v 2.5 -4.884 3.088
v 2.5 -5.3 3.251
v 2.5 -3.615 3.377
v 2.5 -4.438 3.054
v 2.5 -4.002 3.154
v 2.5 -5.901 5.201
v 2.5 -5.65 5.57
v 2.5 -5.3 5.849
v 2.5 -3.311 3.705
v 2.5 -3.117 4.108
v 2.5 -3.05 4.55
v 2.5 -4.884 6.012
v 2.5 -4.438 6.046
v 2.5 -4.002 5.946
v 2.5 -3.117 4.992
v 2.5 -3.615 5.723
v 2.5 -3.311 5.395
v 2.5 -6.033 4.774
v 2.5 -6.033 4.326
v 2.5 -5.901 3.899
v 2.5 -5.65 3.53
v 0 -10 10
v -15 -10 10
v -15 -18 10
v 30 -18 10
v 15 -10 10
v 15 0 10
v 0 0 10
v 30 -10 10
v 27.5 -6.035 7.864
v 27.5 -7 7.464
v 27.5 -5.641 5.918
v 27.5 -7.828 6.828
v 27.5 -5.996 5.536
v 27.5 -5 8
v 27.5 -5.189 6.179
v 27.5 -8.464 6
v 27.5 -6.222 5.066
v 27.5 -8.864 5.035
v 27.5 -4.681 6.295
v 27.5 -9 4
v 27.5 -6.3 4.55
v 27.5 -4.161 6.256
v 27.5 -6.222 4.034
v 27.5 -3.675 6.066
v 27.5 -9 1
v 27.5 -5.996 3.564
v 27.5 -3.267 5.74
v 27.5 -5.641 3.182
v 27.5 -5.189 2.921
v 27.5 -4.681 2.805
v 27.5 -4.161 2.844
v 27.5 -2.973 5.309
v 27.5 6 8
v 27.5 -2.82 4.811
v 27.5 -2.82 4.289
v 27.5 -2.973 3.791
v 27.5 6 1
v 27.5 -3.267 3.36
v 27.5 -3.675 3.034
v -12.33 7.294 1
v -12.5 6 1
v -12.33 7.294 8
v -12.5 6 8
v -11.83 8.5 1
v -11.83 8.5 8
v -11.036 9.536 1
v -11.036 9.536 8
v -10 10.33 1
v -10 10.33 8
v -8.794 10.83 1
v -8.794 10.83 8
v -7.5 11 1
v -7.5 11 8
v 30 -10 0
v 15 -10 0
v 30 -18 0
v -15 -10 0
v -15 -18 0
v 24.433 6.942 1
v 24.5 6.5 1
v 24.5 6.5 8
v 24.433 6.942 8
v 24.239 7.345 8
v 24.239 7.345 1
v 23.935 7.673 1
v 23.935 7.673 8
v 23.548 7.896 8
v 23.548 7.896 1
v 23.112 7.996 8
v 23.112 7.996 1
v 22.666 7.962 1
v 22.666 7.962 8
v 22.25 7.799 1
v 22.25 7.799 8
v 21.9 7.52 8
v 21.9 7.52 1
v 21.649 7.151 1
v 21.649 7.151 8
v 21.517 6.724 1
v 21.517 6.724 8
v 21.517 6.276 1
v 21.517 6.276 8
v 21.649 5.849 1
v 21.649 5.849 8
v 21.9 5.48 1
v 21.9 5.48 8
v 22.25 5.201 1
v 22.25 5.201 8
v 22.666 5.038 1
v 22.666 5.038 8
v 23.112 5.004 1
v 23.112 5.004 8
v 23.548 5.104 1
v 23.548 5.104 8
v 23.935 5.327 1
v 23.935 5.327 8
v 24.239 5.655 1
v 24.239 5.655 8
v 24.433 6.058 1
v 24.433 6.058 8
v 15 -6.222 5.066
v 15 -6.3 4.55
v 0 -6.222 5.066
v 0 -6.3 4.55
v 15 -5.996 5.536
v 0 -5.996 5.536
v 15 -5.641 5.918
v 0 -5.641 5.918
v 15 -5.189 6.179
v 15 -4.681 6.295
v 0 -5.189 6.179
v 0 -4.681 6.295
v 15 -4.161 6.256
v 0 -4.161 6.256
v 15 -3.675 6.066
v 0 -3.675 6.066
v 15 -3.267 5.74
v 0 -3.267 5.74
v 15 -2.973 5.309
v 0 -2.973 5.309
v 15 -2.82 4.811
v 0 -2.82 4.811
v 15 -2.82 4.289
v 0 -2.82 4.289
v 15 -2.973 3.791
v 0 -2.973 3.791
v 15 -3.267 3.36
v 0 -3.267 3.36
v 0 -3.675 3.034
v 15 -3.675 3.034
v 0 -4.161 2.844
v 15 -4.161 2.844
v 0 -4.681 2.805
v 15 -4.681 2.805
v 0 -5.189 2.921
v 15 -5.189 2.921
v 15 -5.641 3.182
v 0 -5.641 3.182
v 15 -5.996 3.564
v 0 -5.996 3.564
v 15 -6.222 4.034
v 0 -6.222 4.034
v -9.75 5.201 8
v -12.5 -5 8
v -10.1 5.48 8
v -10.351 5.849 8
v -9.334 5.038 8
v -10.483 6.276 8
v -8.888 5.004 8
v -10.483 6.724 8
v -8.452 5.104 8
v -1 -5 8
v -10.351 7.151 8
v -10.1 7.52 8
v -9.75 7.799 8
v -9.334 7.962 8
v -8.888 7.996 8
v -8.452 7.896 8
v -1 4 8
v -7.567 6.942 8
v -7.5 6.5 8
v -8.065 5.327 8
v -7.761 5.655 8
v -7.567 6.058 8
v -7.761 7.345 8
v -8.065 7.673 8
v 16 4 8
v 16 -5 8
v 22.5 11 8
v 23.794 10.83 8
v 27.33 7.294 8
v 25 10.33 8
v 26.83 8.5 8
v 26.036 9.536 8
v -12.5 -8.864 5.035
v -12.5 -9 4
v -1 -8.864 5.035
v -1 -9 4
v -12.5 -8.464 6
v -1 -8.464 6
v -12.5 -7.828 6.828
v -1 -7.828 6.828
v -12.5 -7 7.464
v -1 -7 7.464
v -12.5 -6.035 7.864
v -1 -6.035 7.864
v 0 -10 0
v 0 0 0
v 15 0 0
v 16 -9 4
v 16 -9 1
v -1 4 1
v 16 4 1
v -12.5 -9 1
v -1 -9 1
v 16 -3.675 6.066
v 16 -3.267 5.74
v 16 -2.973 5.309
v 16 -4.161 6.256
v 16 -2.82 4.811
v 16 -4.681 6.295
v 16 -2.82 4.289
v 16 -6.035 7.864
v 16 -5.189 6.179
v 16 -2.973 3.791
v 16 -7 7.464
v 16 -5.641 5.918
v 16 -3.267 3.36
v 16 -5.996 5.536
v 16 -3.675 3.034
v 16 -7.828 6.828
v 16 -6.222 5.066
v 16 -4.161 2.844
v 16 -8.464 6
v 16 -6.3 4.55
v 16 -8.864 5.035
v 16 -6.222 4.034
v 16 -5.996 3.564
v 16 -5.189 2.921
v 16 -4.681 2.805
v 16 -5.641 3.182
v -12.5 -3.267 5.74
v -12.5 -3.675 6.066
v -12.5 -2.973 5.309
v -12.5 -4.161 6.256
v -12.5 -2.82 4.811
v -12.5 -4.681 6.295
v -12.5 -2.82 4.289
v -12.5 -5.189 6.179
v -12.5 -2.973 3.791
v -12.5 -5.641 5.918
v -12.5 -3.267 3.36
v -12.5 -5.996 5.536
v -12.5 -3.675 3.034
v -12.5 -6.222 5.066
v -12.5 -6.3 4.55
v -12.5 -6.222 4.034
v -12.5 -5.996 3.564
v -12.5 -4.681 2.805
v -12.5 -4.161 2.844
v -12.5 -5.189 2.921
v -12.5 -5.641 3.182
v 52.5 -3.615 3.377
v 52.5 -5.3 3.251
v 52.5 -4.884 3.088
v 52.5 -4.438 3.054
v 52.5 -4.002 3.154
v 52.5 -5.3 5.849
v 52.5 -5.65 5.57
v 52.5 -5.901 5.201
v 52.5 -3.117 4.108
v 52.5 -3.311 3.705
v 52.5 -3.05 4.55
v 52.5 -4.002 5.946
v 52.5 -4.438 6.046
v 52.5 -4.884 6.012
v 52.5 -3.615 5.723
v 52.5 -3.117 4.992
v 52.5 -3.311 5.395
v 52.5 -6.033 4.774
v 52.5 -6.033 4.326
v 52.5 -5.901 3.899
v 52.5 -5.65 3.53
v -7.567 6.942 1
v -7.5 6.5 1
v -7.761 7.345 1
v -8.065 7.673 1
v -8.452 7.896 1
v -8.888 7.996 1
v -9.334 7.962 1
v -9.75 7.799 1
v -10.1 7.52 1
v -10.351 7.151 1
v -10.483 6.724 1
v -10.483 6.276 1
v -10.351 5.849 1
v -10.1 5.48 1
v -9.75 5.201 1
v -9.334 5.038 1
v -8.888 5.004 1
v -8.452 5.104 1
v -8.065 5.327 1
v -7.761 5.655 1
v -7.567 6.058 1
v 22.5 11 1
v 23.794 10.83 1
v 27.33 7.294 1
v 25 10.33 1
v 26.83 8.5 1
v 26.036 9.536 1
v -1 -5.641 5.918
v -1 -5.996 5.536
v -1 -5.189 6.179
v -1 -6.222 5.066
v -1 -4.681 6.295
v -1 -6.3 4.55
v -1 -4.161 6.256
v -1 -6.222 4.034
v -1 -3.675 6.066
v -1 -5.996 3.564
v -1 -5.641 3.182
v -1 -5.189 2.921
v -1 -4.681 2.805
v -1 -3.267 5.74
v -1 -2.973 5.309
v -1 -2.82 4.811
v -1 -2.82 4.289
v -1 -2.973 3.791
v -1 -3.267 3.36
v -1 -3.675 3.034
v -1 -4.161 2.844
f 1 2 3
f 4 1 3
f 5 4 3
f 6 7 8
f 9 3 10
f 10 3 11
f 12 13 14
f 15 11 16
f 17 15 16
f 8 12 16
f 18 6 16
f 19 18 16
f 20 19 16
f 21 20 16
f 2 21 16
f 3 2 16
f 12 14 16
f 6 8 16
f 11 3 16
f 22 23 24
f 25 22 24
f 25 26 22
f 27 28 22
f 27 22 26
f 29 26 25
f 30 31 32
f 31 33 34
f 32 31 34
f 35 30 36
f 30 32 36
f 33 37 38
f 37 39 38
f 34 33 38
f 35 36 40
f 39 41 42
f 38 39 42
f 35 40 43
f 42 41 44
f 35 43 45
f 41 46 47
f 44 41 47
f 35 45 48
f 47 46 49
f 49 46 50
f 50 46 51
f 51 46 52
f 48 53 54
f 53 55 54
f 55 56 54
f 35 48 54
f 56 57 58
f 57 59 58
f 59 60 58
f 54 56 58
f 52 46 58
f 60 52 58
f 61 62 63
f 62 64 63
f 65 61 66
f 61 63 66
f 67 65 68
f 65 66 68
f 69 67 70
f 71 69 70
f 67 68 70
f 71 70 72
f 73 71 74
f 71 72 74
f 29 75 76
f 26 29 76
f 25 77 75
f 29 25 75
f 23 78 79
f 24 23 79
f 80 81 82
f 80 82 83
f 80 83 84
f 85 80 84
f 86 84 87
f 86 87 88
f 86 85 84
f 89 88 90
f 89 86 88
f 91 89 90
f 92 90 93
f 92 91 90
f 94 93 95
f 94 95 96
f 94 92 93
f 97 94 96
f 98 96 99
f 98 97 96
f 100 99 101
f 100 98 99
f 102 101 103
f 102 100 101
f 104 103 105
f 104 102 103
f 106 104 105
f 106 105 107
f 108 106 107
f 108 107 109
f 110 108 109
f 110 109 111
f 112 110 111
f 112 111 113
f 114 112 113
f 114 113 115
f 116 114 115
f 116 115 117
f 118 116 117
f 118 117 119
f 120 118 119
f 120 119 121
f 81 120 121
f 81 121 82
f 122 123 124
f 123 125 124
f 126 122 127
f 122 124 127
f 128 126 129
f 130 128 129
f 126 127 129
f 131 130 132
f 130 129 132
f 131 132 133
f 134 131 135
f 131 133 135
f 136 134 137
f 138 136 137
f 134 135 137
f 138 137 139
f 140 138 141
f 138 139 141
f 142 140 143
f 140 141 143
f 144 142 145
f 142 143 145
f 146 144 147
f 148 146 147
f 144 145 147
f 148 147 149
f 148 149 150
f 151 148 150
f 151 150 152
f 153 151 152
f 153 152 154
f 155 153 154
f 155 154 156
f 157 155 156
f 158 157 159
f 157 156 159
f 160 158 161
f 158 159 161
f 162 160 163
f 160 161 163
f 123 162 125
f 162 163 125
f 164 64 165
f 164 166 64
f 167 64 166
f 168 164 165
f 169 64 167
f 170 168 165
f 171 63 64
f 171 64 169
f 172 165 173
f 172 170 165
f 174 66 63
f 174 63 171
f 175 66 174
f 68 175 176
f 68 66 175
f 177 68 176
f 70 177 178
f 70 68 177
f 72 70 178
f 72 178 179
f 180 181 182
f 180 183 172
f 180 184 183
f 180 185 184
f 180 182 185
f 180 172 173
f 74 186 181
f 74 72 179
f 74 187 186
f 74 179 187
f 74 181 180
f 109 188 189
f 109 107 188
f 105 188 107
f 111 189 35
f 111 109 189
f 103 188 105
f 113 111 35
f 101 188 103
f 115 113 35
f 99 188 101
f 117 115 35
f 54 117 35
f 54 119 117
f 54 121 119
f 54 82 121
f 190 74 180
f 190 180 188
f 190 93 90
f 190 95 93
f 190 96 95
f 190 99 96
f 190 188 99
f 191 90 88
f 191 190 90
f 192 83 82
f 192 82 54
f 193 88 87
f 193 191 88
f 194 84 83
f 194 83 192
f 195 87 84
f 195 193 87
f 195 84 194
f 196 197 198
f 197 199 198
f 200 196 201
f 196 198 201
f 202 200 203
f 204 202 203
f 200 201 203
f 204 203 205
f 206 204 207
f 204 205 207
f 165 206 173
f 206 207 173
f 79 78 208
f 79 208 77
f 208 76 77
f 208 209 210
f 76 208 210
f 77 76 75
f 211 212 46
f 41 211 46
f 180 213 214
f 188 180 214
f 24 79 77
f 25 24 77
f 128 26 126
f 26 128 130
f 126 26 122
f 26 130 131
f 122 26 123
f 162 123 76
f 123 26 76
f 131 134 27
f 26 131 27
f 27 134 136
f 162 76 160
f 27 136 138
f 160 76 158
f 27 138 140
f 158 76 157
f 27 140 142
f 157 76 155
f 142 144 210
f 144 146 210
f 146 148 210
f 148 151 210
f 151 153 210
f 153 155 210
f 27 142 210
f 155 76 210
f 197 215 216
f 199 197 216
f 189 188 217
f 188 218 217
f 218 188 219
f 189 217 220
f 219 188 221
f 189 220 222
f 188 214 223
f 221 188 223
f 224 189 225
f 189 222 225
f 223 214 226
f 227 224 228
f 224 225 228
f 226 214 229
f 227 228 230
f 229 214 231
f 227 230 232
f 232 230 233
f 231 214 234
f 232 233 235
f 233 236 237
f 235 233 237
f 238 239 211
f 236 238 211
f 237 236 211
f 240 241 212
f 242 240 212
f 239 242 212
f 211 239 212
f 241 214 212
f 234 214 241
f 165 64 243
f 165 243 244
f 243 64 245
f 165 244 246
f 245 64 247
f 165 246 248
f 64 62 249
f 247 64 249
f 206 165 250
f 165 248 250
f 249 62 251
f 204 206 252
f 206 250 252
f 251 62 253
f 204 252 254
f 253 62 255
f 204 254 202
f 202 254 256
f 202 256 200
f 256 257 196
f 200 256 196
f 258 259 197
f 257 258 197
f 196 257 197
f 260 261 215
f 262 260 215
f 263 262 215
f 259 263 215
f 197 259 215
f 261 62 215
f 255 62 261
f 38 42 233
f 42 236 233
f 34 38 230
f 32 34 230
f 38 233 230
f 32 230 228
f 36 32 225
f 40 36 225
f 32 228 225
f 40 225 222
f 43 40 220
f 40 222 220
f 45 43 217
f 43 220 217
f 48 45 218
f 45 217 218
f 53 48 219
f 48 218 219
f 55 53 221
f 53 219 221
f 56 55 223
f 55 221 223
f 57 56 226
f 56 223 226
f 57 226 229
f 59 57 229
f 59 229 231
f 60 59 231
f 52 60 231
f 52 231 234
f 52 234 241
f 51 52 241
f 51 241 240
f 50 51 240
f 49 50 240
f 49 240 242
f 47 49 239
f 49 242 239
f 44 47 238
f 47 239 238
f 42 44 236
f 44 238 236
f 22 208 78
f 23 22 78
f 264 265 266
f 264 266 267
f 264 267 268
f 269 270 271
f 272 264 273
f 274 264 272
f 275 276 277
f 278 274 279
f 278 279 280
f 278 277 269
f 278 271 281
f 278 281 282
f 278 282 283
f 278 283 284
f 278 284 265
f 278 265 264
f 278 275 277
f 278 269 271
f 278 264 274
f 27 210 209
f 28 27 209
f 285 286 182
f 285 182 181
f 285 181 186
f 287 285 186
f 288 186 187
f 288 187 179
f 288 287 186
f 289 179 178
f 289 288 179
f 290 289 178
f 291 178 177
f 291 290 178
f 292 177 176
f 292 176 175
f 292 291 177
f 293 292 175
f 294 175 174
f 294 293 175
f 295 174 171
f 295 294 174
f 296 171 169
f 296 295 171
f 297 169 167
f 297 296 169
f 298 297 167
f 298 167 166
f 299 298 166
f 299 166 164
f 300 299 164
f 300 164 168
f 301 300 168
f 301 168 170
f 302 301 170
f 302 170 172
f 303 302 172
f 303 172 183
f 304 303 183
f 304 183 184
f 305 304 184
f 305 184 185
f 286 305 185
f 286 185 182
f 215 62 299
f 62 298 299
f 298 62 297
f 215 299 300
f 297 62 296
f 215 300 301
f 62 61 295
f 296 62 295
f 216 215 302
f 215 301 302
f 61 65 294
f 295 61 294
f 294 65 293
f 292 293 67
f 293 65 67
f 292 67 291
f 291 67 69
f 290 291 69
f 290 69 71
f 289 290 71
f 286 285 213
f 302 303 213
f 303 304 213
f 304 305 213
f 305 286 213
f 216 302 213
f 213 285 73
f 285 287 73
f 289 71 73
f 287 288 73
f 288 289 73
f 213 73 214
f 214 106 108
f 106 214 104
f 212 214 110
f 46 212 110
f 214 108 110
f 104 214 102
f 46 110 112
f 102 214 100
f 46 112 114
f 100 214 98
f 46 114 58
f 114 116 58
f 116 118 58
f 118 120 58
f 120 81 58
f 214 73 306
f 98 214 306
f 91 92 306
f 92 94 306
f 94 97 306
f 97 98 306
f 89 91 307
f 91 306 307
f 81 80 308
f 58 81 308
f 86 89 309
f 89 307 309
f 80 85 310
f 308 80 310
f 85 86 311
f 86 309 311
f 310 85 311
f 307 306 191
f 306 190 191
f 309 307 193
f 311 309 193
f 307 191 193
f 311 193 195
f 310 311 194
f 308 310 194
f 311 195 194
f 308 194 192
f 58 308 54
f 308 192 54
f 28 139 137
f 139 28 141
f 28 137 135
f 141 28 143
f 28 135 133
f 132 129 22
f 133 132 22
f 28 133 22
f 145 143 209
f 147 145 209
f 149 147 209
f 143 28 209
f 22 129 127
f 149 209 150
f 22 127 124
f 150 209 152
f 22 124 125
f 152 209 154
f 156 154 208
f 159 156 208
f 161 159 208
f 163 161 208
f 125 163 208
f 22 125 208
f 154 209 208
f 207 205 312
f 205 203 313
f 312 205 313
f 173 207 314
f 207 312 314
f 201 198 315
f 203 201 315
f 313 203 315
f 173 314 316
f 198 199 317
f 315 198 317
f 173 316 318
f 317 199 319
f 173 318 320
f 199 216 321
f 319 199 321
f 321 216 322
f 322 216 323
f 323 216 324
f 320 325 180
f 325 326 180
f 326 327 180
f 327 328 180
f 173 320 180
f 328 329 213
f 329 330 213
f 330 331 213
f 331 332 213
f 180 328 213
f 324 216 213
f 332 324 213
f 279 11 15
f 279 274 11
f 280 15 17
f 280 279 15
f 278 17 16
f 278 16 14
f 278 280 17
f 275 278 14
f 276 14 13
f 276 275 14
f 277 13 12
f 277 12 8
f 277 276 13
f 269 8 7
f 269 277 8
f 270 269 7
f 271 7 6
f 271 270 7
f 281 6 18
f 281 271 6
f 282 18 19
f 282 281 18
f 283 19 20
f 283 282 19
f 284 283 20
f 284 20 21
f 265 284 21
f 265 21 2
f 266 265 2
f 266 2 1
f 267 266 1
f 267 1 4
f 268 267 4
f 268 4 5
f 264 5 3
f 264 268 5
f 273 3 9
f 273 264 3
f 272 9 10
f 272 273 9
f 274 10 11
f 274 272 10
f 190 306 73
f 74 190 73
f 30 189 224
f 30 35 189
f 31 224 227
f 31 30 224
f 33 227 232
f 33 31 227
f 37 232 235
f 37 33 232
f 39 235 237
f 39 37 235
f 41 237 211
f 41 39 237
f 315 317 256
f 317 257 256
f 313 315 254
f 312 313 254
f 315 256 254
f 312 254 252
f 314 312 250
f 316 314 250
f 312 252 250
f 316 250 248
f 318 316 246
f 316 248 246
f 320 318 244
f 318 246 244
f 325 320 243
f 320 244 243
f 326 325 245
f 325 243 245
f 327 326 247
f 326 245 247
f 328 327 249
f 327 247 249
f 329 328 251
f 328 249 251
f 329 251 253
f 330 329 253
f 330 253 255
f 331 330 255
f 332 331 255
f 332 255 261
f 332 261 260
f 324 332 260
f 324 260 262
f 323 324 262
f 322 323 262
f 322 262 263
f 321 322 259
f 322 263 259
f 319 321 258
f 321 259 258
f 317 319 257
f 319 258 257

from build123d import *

# Parameters (mm, degrees)
F1_DEPTH = 10
F0_R     = 1.5
F2_DEPTH = 8
F3_R     = 1.75
F4_DEPTH = 50
F5_R     = 1.5
F6_DEPTH = 25
F7_DEPTH = 1
F8_R     = 4
F9_R     = 5


with BuildPart() as f1:
    # F0 (on Top) → F1 (new body)
    with BuildSketch(Plane.XY):
        Polygon((15, 0), (0, 0), (0, -10), (-15, -10), (-15, -18), (30, -18), (30, -10), (15, -10), align=None)
    extrude(amount=F1_DEPTH)


with BuildPart() as f2:
    # F0 (on Top) → F2 (new body)
    with BuildSketch(Plane.XY):
        Polygon((-12.5, 11), (-12.5, -9), (-1, -9), (-1, 4), (16, 4), (16, -9), (27.5, -9), (27.5, 11), align=None)
        with Locations((-9, 6.5)):
            Circle(F0_R, mode=Mode.SUBTRACT)
        with Locations((23, 6.5)):
            Circle(F0_R, mode=Mode.SUBTRACT)
    extrude(amount=F2_DEPTH)


with BuildPart() as f4_tool:
    # F3 (on face) → F4 (new body, symmetric)
    with BuildSketch(Plane(origin=(0, 0, 0), x_dir=(0, -1, 0), z_dir=(-1, 0, 0))):
        with Locations((4.55, 4.55)):
            Circle(F3_R)
    extrude(amount=F4_DEPTH, both=True)


with BuildPart() as f1_1:
    add(f1.part)

    # F4: cut by f4_tool
    add(f4_tool.part, mode=Mode.SUBTRACT)


with BuildPart() as f2_1:
    add(f2.part)

    # F4: cut by f4_tool
    add(f4_tool.part, mode=Mode.SUBTRACT)

    # F0 (on Top) → F7 (cut)
    with BuildSketch(Plane.XY):
        Polygon((-12.5, 11), (-12.5, -9), (-1, -9), (-1, 4), (16, 4), (16, -9), (27.5, -9), (27.5, 11), align=None)
        with Locations((-9, 6.5)):
            Circle(F0_R, mode=Mode.SUBTRACT)
        with Locations((23, 6.5)):
            Circle(F0_R, mode=Mode.SUBTRACT)
    extrude(amount=F7_DEPTH, mode=Mode.SUBTRACT)

    # F8
    f8_edges = [f2_1.edges().sort_by_distance(p)[0] for p in [
        (21.75, -9, 8),
        (-6.75, -9, 8),
    ]]
    fillet(f8_edges, radius=F8_R)

    # F9
    f9_edges = [f2_1.edges().sort_by_distance(p)[0] for p in [
        (27.5, 11, 4.5),
        (-12.5, 11, 4.5),
    ]]
    fillet(f9_edges, radius=F9_R)


with BuildPart() as f6:
    # F5 (on face) → F6 (new body, symmetric)
    with BuildSketch(Plane.YZ.offset(27.5)):
        with Locations((-4.55, 4.55)):
            Circle(F5_R)
    extrude(amount=F6_DEPTH, both=True)


solid = Compound([f1_1.part, f2_1.part, f6.part])
